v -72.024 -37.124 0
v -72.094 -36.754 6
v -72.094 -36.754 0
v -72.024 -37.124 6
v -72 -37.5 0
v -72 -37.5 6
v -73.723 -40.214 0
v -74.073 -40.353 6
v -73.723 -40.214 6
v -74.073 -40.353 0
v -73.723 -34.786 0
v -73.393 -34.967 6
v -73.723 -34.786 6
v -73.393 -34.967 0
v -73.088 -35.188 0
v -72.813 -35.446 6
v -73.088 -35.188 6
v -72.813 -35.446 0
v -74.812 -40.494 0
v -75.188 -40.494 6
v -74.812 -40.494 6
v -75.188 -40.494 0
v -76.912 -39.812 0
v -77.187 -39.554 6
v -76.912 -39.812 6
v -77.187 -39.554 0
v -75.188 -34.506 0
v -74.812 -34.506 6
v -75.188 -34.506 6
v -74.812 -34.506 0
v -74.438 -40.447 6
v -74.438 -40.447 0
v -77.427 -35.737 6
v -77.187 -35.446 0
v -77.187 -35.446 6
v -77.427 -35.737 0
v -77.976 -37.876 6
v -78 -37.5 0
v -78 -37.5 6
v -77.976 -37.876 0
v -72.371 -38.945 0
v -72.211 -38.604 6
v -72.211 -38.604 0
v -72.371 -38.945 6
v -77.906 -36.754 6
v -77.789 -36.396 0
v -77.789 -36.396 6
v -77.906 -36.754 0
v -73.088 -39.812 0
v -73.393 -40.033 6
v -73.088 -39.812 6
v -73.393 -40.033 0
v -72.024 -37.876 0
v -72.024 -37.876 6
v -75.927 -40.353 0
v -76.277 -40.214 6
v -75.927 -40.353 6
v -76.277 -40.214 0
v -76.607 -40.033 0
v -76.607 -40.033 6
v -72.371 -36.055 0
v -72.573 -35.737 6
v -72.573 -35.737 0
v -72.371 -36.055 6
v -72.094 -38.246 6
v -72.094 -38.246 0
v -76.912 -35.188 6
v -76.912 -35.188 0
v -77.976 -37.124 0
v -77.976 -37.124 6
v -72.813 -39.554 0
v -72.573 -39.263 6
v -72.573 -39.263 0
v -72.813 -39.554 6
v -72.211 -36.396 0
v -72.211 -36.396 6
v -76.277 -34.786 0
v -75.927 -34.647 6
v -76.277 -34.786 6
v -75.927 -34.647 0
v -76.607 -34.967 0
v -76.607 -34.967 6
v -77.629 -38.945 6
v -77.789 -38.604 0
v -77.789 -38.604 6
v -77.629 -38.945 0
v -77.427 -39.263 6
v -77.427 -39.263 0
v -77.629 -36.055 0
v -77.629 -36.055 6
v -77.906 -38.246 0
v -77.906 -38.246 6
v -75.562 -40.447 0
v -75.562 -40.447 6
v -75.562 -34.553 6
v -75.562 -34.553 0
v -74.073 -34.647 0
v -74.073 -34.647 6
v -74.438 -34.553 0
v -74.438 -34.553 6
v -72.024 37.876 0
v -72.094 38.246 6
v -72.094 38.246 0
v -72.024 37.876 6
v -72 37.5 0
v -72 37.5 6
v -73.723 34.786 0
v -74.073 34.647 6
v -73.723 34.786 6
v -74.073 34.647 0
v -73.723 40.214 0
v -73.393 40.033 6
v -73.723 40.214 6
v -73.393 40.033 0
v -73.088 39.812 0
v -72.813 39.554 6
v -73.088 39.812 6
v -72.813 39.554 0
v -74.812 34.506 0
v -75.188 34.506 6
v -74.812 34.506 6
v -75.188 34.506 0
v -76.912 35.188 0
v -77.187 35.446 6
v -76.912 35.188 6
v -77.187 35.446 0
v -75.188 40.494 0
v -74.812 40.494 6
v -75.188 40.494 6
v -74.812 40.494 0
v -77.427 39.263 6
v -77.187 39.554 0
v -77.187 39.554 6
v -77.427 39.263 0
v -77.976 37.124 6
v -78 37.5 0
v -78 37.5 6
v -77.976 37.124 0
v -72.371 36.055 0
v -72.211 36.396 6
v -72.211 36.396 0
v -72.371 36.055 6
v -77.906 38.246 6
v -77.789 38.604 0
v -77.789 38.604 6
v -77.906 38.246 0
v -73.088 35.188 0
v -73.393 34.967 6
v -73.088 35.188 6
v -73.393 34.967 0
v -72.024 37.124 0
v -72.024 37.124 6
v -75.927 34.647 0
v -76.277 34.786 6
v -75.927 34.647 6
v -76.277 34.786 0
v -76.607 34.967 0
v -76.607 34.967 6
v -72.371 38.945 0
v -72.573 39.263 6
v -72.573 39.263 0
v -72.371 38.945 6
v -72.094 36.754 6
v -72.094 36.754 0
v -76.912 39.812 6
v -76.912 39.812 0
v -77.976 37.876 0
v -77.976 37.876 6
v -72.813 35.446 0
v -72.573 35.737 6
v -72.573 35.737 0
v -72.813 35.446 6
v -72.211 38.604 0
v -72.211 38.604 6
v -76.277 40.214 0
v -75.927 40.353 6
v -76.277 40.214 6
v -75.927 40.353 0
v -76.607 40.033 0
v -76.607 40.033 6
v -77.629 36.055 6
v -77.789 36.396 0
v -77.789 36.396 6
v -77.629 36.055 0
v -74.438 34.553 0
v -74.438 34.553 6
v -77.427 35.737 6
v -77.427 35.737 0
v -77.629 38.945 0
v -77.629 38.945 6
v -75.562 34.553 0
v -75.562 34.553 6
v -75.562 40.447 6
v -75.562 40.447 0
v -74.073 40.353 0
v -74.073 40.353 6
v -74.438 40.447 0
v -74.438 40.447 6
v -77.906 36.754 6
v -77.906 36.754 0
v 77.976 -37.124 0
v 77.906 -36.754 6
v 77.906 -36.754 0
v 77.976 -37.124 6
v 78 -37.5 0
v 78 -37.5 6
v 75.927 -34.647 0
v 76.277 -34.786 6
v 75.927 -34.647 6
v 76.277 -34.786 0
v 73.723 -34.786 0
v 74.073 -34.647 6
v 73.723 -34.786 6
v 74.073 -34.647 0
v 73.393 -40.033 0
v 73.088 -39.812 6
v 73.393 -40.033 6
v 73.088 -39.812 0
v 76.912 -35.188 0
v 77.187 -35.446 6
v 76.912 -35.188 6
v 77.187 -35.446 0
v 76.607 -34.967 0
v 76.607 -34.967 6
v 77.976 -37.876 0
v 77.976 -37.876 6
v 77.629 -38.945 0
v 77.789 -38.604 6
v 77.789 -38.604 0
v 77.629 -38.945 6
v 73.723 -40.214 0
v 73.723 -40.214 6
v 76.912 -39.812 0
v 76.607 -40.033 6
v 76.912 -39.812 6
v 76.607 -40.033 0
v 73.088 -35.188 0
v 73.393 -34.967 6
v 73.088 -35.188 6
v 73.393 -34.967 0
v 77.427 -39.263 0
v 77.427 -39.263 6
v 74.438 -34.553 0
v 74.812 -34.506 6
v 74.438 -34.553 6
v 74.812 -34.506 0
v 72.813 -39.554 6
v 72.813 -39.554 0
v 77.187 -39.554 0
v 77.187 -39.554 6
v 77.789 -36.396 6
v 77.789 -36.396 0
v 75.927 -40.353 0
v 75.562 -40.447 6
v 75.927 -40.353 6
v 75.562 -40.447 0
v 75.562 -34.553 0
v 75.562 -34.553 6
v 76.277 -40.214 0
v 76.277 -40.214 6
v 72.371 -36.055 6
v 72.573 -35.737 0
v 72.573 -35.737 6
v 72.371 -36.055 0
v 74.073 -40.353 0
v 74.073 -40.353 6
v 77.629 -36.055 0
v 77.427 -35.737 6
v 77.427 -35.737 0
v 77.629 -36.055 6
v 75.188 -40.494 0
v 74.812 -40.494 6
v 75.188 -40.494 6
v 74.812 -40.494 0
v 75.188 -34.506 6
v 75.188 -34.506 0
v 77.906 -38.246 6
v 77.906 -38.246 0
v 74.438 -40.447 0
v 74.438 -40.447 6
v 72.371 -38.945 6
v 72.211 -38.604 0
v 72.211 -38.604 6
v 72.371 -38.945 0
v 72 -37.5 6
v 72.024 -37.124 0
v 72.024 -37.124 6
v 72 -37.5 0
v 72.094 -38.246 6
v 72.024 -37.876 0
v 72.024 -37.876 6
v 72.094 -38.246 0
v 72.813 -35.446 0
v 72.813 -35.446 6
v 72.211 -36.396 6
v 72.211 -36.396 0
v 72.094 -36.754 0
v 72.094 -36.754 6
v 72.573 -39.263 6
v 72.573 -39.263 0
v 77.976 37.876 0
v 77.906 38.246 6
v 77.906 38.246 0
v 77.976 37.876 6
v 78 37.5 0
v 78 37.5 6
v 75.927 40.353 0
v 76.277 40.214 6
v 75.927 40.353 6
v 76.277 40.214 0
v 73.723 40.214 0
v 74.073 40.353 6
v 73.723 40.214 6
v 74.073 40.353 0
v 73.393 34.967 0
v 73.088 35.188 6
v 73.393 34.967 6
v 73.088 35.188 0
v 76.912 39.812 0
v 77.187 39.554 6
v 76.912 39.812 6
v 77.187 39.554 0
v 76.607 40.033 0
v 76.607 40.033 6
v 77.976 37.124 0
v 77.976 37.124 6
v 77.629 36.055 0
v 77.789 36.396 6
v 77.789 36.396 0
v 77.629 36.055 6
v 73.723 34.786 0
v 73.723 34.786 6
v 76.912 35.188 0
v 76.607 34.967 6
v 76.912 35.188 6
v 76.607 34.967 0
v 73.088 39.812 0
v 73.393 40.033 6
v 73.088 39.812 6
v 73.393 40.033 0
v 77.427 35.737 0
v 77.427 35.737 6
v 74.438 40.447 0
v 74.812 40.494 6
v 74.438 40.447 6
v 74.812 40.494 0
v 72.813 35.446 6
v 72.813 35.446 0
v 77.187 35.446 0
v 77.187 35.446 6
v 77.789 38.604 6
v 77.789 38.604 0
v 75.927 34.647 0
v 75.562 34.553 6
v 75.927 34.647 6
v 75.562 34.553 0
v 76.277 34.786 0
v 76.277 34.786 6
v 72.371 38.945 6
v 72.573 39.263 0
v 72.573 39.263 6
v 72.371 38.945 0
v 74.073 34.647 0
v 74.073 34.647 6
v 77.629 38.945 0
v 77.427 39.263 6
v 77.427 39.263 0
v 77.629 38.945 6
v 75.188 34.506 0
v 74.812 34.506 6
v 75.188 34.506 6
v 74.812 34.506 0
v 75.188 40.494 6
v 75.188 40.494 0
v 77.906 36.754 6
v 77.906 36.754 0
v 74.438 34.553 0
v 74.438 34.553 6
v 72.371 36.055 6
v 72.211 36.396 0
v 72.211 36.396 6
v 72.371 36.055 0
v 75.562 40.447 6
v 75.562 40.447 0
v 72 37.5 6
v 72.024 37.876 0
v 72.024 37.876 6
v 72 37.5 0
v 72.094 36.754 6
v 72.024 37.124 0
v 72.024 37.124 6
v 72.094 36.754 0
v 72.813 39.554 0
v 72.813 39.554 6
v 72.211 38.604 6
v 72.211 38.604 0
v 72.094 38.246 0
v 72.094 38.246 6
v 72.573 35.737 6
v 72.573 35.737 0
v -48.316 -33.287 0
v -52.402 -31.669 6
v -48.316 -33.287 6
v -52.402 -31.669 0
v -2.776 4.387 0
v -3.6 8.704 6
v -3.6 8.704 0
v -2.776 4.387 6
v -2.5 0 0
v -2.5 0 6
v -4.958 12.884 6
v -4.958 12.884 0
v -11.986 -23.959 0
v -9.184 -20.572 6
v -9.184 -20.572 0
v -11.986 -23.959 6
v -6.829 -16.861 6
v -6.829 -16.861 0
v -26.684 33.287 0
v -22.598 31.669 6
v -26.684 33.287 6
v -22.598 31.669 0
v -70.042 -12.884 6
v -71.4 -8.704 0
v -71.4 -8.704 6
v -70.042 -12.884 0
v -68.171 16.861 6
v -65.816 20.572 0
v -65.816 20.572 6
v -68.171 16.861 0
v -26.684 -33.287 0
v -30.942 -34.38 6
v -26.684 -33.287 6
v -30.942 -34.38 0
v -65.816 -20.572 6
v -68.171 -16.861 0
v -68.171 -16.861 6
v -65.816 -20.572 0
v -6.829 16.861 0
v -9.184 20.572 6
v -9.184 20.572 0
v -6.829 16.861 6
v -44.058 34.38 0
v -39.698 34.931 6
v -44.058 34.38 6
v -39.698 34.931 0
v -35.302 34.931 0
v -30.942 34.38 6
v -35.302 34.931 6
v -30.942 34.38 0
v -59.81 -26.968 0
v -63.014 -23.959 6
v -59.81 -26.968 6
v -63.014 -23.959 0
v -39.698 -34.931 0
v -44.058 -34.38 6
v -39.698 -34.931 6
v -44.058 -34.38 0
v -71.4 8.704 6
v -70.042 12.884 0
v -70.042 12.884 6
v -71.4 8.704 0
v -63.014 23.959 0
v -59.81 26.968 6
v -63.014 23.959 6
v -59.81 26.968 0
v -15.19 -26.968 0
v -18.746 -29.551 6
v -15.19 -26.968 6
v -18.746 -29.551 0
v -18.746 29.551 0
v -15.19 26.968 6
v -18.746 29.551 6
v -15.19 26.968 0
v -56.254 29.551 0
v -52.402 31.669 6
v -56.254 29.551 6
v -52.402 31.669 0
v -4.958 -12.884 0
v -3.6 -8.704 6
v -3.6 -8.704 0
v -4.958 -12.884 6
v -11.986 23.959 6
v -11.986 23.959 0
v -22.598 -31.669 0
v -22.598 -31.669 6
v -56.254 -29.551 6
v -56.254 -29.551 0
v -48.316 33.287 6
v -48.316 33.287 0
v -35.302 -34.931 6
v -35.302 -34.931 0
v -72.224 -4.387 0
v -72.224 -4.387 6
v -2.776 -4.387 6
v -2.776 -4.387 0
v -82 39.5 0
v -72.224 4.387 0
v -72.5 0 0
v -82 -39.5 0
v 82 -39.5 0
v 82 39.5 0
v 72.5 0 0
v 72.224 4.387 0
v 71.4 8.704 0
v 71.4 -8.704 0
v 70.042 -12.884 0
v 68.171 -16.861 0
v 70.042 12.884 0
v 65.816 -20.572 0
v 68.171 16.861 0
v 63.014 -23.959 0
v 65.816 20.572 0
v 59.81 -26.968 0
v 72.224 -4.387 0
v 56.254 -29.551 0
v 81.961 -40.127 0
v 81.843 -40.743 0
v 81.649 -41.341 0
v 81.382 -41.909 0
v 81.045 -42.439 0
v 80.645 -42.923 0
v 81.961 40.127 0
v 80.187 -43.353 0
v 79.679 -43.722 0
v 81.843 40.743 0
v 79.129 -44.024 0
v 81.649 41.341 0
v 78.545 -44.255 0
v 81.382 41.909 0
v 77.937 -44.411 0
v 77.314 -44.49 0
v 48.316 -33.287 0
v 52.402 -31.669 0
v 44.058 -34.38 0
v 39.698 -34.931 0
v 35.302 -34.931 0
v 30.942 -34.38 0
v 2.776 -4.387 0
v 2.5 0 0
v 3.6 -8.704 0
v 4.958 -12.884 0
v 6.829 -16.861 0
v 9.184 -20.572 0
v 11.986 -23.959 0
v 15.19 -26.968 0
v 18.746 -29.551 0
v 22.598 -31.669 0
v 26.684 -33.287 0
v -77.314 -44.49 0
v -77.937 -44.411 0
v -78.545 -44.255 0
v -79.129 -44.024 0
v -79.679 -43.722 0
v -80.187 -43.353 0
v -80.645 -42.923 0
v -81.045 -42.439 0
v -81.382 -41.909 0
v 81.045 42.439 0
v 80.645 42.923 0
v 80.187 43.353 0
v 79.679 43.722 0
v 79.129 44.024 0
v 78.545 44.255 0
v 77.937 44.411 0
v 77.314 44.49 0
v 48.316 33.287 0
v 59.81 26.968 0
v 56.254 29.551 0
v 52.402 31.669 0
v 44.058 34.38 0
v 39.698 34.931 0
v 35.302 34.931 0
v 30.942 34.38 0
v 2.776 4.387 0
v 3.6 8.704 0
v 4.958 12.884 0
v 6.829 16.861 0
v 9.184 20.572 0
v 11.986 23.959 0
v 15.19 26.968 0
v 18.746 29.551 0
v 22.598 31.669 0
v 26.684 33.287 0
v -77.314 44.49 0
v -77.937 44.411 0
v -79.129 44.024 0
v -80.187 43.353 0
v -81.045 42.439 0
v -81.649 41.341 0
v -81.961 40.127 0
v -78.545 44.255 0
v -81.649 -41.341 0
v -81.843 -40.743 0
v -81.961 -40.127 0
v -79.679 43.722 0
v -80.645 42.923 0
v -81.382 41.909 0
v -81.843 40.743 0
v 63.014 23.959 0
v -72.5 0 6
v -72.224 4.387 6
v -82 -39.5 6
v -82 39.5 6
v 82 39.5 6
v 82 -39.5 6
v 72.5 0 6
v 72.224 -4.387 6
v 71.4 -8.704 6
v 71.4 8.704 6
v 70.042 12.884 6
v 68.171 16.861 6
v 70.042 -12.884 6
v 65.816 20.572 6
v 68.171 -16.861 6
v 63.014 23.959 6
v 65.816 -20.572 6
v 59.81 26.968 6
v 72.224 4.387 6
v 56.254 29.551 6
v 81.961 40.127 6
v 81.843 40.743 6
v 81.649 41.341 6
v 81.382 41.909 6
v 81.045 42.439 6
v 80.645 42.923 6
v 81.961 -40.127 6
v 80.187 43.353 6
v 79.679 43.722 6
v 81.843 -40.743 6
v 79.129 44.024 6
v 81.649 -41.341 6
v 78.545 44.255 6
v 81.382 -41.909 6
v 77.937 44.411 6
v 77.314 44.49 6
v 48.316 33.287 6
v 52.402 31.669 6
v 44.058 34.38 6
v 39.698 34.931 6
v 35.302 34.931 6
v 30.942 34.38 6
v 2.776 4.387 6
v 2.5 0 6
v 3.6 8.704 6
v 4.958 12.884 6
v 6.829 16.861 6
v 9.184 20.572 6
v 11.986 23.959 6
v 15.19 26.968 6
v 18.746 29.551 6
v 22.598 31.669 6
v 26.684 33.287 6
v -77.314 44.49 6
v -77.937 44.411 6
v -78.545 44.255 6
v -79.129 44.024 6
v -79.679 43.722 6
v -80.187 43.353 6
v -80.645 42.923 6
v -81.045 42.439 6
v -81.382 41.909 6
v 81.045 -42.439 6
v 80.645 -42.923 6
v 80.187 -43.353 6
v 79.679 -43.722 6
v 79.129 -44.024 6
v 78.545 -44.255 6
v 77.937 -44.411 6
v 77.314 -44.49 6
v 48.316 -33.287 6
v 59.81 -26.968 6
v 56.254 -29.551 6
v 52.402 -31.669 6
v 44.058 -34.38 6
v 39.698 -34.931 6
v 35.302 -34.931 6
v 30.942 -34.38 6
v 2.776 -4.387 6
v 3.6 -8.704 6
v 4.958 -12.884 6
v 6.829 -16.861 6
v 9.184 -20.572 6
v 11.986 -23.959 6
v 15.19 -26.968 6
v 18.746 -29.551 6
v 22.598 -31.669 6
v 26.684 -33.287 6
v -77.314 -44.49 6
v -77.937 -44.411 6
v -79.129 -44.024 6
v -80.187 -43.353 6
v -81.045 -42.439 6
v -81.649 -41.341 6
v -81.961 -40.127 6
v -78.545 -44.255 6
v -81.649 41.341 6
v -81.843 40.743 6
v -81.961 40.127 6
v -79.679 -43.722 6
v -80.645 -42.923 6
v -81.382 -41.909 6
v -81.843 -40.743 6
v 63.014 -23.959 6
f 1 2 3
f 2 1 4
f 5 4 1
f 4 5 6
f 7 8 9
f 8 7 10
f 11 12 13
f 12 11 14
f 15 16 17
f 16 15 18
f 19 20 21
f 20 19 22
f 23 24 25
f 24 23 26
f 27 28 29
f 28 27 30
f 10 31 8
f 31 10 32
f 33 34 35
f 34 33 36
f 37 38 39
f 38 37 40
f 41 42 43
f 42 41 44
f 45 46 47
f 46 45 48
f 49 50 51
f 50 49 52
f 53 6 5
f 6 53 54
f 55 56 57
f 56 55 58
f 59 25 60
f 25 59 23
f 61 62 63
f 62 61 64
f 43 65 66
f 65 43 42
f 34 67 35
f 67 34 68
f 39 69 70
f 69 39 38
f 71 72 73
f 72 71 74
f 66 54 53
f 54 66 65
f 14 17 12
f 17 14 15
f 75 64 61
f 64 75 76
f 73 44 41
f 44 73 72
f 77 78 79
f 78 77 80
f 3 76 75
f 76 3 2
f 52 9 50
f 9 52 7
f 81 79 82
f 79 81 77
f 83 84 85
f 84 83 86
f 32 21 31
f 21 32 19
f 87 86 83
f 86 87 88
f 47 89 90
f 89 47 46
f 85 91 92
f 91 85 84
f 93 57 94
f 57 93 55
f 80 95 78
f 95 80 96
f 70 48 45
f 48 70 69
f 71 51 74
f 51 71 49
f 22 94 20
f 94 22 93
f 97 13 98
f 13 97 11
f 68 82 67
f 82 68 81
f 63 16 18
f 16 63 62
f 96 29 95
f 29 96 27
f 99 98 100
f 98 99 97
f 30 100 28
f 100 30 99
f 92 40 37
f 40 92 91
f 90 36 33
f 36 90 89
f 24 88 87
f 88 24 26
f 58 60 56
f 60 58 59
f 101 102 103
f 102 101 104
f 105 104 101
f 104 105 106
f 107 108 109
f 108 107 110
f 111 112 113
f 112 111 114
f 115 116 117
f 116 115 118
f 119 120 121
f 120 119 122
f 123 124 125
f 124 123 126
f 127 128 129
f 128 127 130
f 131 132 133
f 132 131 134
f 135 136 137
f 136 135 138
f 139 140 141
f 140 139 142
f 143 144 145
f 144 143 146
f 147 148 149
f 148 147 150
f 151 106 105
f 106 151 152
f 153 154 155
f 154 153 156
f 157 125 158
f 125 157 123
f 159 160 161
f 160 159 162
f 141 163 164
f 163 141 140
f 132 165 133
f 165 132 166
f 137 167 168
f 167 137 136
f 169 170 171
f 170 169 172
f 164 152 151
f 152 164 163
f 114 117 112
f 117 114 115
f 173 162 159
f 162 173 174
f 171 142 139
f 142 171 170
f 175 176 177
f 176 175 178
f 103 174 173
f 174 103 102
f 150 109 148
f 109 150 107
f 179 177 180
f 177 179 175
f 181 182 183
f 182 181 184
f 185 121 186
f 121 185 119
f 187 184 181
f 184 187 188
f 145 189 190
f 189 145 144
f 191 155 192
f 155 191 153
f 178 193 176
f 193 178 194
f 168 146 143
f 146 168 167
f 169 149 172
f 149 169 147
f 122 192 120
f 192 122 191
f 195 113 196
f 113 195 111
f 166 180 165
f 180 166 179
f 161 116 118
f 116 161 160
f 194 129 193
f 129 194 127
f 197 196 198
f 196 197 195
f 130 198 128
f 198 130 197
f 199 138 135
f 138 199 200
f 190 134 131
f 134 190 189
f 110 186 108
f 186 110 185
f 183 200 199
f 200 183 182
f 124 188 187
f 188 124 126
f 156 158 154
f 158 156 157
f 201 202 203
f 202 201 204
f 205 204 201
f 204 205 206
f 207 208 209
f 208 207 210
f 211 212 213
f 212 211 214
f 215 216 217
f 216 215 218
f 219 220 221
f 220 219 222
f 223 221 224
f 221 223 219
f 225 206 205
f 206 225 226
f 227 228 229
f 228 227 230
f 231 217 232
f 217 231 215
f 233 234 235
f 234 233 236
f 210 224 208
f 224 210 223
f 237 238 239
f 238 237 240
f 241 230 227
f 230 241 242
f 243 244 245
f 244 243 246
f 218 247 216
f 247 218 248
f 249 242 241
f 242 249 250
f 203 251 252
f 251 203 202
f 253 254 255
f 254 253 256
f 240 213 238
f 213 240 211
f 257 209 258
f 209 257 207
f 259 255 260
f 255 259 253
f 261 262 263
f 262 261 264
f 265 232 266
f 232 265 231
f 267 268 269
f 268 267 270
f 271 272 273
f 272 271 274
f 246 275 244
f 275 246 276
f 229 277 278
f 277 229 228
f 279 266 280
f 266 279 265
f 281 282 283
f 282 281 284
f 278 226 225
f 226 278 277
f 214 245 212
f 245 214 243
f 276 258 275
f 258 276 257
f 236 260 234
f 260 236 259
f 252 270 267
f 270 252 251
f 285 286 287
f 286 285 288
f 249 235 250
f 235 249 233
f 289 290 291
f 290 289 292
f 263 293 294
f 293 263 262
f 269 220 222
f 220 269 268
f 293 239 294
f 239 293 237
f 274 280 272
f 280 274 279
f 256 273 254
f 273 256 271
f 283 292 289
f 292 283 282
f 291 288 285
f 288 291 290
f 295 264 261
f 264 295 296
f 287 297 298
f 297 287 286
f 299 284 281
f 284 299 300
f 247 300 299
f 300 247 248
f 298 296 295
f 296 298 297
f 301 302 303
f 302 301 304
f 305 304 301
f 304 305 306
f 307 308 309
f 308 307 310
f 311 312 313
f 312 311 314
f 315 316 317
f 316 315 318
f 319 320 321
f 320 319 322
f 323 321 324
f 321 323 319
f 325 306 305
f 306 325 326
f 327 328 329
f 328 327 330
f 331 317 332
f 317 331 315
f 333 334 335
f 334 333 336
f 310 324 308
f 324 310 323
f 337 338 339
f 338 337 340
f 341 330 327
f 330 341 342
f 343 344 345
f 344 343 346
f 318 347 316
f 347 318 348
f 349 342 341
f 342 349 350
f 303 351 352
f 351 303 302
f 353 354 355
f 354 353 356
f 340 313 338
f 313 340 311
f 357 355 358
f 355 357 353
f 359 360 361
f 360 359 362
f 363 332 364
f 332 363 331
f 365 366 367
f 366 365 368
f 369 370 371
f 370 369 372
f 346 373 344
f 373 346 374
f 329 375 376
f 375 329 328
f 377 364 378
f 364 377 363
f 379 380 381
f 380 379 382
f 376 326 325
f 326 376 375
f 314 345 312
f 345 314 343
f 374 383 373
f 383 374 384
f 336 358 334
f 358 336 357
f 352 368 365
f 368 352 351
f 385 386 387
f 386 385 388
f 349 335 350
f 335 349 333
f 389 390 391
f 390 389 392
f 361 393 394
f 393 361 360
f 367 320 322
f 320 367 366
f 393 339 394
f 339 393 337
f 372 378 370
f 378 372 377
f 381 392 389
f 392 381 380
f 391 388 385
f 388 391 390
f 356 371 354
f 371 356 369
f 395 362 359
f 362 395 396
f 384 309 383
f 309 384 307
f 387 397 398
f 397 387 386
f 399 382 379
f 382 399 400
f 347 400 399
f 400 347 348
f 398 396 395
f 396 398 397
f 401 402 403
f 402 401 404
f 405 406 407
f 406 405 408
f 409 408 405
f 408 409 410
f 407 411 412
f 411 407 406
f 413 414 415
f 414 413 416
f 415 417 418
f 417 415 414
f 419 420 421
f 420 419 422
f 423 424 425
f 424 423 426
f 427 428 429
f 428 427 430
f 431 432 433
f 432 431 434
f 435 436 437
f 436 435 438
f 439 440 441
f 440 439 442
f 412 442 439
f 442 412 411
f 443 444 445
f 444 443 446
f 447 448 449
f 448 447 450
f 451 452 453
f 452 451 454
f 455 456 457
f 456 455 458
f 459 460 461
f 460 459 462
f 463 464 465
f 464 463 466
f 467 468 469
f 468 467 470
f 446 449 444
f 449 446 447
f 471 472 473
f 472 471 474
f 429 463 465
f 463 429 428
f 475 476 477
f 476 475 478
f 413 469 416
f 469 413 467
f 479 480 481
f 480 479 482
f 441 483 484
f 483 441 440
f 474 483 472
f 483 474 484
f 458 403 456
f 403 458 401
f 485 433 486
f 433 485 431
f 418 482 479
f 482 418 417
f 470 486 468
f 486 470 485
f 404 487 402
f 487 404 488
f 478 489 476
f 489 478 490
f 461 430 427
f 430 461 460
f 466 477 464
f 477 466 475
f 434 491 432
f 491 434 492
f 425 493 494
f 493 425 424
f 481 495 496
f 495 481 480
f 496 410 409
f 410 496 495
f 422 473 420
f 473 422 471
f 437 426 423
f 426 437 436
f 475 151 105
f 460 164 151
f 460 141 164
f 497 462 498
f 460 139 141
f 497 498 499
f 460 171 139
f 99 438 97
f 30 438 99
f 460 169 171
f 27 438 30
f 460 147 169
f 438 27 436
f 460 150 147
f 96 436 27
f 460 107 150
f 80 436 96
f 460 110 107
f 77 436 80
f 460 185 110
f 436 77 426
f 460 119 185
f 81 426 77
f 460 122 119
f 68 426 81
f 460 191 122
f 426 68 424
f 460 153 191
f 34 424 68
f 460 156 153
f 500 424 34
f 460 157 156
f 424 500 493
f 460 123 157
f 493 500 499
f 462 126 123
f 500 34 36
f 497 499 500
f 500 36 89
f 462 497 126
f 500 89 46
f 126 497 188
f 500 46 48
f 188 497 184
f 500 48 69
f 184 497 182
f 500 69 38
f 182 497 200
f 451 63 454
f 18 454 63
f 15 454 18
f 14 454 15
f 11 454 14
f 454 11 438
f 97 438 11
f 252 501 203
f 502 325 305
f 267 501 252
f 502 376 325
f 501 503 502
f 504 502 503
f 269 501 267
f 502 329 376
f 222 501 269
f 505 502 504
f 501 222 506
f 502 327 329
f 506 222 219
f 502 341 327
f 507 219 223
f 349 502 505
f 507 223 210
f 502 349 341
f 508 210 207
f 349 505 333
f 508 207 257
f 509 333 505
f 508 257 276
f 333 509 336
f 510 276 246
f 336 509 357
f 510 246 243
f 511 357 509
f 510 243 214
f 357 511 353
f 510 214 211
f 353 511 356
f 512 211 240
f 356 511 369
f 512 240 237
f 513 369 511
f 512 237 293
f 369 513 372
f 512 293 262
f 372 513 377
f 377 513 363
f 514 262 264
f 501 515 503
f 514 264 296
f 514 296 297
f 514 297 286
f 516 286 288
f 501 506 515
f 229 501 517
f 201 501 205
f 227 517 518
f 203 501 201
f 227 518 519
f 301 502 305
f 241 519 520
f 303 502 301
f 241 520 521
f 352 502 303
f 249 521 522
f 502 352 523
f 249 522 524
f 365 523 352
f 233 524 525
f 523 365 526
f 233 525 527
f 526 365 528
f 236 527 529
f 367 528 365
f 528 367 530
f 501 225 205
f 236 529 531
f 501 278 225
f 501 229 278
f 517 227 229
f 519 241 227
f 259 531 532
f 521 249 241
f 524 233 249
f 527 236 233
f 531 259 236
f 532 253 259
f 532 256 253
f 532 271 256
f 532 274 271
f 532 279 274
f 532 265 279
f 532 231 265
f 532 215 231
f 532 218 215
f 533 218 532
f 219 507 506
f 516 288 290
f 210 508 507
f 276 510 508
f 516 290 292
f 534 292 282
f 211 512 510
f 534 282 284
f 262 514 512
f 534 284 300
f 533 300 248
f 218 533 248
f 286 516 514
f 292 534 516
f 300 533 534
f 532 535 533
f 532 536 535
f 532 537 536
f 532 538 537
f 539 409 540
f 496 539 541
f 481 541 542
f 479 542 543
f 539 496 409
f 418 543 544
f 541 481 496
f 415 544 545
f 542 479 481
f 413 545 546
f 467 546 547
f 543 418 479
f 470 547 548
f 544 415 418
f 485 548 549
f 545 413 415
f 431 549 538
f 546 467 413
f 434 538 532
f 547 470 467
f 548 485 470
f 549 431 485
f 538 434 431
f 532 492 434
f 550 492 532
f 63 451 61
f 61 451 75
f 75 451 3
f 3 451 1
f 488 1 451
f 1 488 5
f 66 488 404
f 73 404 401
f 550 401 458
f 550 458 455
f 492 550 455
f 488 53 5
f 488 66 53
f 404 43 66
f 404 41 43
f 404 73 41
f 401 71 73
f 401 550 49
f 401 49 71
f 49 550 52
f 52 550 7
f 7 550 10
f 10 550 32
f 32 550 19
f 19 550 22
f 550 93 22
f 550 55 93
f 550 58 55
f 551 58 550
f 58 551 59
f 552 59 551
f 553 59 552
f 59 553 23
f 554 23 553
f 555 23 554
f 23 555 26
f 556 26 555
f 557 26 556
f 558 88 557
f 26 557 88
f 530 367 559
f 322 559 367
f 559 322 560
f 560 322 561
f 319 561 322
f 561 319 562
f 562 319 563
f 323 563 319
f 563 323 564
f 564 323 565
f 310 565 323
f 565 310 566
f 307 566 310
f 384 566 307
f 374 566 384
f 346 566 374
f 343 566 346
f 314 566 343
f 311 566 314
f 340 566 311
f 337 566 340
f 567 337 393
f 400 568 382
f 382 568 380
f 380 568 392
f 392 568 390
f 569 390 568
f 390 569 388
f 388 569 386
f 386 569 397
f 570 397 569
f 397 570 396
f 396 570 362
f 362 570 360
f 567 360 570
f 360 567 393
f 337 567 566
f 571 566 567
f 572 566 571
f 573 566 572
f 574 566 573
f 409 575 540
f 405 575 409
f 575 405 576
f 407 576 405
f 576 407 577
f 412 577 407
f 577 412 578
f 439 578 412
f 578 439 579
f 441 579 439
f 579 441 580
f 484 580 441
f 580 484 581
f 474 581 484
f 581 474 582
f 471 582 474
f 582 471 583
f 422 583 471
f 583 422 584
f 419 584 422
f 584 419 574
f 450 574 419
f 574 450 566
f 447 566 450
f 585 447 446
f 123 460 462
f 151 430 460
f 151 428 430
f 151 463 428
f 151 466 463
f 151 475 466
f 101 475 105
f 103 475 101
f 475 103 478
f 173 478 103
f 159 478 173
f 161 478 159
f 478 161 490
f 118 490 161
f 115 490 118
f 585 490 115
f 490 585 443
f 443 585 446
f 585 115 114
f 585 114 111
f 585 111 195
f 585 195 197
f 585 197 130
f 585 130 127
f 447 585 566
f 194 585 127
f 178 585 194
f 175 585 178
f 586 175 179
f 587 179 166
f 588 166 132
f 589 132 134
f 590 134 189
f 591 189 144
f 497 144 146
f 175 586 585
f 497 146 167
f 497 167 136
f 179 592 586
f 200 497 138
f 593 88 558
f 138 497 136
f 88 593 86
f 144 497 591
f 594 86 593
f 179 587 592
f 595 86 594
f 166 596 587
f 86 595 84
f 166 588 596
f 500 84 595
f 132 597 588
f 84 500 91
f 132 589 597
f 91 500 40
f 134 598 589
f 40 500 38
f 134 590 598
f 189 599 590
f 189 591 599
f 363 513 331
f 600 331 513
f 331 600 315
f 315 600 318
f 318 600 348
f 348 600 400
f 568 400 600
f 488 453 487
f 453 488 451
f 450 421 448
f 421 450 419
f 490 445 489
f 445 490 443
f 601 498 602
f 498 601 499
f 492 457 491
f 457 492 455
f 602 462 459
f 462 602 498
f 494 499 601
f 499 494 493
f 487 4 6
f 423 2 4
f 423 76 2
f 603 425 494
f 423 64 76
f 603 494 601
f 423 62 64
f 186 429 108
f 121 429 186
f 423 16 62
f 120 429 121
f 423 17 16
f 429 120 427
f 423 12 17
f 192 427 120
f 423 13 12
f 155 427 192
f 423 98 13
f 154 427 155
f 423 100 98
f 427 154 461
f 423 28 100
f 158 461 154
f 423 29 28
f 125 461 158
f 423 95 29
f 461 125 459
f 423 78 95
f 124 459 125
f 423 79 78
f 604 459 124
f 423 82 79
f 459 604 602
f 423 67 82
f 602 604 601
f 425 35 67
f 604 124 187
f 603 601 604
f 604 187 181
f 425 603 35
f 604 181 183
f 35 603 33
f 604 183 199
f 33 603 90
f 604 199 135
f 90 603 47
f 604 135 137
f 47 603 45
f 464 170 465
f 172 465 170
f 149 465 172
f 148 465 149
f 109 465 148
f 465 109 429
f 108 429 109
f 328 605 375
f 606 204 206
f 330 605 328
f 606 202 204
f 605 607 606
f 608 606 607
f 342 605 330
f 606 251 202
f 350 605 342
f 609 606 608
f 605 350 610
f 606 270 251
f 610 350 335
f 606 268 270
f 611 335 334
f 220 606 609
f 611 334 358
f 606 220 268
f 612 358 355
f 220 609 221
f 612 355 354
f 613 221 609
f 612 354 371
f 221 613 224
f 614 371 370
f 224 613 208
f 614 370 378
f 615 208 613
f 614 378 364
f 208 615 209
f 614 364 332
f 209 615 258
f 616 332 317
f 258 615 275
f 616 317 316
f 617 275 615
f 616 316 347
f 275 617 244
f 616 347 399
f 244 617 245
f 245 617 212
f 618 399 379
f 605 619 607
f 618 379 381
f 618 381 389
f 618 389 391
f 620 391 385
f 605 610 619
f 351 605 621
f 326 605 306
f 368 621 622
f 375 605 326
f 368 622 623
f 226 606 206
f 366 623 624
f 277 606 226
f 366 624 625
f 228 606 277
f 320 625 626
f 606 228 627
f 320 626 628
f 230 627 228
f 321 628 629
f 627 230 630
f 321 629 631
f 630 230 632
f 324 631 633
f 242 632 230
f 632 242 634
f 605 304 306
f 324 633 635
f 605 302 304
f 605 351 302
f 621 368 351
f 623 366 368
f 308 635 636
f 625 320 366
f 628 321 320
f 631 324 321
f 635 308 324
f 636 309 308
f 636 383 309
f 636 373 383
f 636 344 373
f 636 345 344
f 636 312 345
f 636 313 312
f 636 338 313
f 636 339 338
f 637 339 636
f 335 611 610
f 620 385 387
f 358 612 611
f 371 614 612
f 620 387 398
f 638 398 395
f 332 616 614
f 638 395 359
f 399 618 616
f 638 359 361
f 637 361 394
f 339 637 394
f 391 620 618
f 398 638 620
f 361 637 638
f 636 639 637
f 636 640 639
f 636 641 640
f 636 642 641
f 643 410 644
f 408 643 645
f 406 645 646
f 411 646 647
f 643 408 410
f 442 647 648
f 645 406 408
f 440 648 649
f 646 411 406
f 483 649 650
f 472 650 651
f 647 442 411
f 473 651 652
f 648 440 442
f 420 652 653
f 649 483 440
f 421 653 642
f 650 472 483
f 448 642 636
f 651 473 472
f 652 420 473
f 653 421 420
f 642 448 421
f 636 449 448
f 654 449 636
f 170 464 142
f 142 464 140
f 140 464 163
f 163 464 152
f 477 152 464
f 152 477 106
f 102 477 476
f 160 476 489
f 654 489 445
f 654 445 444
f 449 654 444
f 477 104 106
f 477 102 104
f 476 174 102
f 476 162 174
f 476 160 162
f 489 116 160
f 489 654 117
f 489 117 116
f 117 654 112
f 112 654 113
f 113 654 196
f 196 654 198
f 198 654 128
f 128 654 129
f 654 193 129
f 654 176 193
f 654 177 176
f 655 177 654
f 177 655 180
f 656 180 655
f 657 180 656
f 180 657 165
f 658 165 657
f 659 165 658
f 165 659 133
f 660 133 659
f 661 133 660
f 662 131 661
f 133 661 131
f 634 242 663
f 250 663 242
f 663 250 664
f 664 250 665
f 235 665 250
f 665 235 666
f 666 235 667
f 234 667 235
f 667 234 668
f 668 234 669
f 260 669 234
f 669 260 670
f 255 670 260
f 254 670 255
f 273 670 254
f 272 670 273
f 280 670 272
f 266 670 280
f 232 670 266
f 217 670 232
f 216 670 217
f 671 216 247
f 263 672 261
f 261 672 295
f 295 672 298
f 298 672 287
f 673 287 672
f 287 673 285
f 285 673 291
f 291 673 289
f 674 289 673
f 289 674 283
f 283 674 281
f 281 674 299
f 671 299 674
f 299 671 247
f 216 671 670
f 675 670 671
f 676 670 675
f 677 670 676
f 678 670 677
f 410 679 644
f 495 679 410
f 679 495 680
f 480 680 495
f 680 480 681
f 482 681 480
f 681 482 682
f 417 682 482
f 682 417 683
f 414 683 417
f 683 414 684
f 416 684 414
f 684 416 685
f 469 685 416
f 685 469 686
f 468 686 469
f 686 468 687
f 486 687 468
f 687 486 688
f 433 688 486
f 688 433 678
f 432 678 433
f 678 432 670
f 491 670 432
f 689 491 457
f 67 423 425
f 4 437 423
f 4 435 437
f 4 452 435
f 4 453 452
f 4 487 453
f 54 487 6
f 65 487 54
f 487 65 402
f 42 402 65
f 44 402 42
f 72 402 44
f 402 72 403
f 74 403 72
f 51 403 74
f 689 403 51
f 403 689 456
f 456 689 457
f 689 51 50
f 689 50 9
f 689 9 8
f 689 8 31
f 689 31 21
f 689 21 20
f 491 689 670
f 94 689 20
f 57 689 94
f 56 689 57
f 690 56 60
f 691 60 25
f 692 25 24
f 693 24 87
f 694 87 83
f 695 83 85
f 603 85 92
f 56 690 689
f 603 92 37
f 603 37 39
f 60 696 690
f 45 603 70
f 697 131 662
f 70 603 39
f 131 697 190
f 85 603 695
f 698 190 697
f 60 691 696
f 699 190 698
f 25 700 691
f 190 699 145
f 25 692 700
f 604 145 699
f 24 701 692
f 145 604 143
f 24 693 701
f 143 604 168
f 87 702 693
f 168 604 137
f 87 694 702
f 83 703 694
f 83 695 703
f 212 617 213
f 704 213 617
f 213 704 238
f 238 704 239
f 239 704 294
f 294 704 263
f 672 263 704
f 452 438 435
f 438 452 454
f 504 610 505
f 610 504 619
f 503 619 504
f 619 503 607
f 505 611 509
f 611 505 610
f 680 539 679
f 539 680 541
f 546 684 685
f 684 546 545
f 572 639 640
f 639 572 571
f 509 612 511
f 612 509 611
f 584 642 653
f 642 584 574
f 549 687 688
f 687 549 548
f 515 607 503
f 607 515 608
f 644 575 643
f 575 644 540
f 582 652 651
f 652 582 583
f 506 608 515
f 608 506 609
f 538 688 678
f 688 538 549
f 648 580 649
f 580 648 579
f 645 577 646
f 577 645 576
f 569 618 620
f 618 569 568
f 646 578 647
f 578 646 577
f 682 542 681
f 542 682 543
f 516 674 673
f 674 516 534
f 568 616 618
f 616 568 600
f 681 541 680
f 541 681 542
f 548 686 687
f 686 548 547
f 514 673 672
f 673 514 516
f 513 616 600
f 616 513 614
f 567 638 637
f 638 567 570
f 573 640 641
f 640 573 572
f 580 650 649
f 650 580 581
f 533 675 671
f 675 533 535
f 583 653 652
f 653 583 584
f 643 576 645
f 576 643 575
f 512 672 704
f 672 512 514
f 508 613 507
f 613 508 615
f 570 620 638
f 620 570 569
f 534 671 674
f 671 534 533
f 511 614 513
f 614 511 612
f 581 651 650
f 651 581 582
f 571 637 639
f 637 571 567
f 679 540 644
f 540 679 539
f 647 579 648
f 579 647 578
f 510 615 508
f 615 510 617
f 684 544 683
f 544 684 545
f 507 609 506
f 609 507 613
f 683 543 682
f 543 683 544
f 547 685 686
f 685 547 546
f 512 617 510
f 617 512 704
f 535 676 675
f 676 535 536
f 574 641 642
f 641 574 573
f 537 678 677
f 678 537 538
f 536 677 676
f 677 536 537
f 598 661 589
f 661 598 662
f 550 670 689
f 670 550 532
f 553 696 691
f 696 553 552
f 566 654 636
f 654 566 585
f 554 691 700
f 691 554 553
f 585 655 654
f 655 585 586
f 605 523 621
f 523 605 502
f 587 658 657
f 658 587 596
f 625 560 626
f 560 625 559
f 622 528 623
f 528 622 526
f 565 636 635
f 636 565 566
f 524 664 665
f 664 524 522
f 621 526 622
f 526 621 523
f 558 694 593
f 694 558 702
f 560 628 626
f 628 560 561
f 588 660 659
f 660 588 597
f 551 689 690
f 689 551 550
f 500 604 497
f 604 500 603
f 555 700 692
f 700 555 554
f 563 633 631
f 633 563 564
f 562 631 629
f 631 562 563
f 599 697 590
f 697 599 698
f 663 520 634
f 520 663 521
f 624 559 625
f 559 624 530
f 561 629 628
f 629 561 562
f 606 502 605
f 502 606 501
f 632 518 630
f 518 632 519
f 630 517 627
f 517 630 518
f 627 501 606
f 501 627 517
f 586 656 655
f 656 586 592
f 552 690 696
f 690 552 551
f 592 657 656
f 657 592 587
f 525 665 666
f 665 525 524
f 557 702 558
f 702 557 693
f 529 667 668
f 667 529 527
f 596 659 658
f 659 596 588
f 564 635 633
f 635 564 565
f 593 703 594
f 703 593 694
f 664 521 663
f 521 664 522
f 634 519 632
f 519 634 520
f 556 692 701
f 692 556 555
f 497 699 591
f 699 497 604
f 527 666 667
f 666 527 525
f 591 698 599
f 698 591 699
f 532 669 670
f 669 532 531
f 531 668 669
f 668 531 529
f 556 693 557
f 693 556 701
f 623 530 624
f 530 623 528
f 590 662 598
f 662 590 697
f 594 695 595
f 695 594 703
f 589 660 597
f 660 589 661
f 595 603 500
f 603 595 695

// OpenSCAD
$fn = 50;


difference() {
	union() {
		hull() {
			translate(v = [-77.0000000000, 39.5000000000, 0]) {
				cylinder(h = 6, r = 5);
			}
			translate(v = [77.0000000000, 39.5000000000, 0]) {
				cylinder(h = 6, r = 5);
			}
			translate(v = [-77.0000000000, -39.5000000000, 0]) {
				cylinder(h = 6, r = 5);
			}
			translate(v = [77.0000000000, -39.5000000000, 0]) {
				cylinder(h = 6, r = 5);
			}
		}
	}
	union() {
		#translate(v = [-75.0000000000, -37.5000000000, -100.0000000000]) {
			cylinder(h = 200, r = 3.0000000000);
		}
		#translate(v = [-75.0000000000, 37.5000000000, -100.0000000000]) {
			cylinder(h = 200, r = 3.0000000000);
		}
		#translate(v = [75.0000000000, -37.5000000000, -100.0000000000]) {
			cylinder(h = 200, r = 3.0000000000);
		}
		#translate(v = [75.0000000000, 37.5000000000, -100.0000000000]) {
			cylinder(h = 200, r = 3.0000000000);
		}
		#translate(v = [-37.5000000000, 0, 0]) {
			cylinder(h = 6, r = 35.0000000000);
		}
		#translate(v = [37.5000000000, 0, 0]) {
			cylinder(h = 6, r = 35.0000000000);
		}
	}
}
